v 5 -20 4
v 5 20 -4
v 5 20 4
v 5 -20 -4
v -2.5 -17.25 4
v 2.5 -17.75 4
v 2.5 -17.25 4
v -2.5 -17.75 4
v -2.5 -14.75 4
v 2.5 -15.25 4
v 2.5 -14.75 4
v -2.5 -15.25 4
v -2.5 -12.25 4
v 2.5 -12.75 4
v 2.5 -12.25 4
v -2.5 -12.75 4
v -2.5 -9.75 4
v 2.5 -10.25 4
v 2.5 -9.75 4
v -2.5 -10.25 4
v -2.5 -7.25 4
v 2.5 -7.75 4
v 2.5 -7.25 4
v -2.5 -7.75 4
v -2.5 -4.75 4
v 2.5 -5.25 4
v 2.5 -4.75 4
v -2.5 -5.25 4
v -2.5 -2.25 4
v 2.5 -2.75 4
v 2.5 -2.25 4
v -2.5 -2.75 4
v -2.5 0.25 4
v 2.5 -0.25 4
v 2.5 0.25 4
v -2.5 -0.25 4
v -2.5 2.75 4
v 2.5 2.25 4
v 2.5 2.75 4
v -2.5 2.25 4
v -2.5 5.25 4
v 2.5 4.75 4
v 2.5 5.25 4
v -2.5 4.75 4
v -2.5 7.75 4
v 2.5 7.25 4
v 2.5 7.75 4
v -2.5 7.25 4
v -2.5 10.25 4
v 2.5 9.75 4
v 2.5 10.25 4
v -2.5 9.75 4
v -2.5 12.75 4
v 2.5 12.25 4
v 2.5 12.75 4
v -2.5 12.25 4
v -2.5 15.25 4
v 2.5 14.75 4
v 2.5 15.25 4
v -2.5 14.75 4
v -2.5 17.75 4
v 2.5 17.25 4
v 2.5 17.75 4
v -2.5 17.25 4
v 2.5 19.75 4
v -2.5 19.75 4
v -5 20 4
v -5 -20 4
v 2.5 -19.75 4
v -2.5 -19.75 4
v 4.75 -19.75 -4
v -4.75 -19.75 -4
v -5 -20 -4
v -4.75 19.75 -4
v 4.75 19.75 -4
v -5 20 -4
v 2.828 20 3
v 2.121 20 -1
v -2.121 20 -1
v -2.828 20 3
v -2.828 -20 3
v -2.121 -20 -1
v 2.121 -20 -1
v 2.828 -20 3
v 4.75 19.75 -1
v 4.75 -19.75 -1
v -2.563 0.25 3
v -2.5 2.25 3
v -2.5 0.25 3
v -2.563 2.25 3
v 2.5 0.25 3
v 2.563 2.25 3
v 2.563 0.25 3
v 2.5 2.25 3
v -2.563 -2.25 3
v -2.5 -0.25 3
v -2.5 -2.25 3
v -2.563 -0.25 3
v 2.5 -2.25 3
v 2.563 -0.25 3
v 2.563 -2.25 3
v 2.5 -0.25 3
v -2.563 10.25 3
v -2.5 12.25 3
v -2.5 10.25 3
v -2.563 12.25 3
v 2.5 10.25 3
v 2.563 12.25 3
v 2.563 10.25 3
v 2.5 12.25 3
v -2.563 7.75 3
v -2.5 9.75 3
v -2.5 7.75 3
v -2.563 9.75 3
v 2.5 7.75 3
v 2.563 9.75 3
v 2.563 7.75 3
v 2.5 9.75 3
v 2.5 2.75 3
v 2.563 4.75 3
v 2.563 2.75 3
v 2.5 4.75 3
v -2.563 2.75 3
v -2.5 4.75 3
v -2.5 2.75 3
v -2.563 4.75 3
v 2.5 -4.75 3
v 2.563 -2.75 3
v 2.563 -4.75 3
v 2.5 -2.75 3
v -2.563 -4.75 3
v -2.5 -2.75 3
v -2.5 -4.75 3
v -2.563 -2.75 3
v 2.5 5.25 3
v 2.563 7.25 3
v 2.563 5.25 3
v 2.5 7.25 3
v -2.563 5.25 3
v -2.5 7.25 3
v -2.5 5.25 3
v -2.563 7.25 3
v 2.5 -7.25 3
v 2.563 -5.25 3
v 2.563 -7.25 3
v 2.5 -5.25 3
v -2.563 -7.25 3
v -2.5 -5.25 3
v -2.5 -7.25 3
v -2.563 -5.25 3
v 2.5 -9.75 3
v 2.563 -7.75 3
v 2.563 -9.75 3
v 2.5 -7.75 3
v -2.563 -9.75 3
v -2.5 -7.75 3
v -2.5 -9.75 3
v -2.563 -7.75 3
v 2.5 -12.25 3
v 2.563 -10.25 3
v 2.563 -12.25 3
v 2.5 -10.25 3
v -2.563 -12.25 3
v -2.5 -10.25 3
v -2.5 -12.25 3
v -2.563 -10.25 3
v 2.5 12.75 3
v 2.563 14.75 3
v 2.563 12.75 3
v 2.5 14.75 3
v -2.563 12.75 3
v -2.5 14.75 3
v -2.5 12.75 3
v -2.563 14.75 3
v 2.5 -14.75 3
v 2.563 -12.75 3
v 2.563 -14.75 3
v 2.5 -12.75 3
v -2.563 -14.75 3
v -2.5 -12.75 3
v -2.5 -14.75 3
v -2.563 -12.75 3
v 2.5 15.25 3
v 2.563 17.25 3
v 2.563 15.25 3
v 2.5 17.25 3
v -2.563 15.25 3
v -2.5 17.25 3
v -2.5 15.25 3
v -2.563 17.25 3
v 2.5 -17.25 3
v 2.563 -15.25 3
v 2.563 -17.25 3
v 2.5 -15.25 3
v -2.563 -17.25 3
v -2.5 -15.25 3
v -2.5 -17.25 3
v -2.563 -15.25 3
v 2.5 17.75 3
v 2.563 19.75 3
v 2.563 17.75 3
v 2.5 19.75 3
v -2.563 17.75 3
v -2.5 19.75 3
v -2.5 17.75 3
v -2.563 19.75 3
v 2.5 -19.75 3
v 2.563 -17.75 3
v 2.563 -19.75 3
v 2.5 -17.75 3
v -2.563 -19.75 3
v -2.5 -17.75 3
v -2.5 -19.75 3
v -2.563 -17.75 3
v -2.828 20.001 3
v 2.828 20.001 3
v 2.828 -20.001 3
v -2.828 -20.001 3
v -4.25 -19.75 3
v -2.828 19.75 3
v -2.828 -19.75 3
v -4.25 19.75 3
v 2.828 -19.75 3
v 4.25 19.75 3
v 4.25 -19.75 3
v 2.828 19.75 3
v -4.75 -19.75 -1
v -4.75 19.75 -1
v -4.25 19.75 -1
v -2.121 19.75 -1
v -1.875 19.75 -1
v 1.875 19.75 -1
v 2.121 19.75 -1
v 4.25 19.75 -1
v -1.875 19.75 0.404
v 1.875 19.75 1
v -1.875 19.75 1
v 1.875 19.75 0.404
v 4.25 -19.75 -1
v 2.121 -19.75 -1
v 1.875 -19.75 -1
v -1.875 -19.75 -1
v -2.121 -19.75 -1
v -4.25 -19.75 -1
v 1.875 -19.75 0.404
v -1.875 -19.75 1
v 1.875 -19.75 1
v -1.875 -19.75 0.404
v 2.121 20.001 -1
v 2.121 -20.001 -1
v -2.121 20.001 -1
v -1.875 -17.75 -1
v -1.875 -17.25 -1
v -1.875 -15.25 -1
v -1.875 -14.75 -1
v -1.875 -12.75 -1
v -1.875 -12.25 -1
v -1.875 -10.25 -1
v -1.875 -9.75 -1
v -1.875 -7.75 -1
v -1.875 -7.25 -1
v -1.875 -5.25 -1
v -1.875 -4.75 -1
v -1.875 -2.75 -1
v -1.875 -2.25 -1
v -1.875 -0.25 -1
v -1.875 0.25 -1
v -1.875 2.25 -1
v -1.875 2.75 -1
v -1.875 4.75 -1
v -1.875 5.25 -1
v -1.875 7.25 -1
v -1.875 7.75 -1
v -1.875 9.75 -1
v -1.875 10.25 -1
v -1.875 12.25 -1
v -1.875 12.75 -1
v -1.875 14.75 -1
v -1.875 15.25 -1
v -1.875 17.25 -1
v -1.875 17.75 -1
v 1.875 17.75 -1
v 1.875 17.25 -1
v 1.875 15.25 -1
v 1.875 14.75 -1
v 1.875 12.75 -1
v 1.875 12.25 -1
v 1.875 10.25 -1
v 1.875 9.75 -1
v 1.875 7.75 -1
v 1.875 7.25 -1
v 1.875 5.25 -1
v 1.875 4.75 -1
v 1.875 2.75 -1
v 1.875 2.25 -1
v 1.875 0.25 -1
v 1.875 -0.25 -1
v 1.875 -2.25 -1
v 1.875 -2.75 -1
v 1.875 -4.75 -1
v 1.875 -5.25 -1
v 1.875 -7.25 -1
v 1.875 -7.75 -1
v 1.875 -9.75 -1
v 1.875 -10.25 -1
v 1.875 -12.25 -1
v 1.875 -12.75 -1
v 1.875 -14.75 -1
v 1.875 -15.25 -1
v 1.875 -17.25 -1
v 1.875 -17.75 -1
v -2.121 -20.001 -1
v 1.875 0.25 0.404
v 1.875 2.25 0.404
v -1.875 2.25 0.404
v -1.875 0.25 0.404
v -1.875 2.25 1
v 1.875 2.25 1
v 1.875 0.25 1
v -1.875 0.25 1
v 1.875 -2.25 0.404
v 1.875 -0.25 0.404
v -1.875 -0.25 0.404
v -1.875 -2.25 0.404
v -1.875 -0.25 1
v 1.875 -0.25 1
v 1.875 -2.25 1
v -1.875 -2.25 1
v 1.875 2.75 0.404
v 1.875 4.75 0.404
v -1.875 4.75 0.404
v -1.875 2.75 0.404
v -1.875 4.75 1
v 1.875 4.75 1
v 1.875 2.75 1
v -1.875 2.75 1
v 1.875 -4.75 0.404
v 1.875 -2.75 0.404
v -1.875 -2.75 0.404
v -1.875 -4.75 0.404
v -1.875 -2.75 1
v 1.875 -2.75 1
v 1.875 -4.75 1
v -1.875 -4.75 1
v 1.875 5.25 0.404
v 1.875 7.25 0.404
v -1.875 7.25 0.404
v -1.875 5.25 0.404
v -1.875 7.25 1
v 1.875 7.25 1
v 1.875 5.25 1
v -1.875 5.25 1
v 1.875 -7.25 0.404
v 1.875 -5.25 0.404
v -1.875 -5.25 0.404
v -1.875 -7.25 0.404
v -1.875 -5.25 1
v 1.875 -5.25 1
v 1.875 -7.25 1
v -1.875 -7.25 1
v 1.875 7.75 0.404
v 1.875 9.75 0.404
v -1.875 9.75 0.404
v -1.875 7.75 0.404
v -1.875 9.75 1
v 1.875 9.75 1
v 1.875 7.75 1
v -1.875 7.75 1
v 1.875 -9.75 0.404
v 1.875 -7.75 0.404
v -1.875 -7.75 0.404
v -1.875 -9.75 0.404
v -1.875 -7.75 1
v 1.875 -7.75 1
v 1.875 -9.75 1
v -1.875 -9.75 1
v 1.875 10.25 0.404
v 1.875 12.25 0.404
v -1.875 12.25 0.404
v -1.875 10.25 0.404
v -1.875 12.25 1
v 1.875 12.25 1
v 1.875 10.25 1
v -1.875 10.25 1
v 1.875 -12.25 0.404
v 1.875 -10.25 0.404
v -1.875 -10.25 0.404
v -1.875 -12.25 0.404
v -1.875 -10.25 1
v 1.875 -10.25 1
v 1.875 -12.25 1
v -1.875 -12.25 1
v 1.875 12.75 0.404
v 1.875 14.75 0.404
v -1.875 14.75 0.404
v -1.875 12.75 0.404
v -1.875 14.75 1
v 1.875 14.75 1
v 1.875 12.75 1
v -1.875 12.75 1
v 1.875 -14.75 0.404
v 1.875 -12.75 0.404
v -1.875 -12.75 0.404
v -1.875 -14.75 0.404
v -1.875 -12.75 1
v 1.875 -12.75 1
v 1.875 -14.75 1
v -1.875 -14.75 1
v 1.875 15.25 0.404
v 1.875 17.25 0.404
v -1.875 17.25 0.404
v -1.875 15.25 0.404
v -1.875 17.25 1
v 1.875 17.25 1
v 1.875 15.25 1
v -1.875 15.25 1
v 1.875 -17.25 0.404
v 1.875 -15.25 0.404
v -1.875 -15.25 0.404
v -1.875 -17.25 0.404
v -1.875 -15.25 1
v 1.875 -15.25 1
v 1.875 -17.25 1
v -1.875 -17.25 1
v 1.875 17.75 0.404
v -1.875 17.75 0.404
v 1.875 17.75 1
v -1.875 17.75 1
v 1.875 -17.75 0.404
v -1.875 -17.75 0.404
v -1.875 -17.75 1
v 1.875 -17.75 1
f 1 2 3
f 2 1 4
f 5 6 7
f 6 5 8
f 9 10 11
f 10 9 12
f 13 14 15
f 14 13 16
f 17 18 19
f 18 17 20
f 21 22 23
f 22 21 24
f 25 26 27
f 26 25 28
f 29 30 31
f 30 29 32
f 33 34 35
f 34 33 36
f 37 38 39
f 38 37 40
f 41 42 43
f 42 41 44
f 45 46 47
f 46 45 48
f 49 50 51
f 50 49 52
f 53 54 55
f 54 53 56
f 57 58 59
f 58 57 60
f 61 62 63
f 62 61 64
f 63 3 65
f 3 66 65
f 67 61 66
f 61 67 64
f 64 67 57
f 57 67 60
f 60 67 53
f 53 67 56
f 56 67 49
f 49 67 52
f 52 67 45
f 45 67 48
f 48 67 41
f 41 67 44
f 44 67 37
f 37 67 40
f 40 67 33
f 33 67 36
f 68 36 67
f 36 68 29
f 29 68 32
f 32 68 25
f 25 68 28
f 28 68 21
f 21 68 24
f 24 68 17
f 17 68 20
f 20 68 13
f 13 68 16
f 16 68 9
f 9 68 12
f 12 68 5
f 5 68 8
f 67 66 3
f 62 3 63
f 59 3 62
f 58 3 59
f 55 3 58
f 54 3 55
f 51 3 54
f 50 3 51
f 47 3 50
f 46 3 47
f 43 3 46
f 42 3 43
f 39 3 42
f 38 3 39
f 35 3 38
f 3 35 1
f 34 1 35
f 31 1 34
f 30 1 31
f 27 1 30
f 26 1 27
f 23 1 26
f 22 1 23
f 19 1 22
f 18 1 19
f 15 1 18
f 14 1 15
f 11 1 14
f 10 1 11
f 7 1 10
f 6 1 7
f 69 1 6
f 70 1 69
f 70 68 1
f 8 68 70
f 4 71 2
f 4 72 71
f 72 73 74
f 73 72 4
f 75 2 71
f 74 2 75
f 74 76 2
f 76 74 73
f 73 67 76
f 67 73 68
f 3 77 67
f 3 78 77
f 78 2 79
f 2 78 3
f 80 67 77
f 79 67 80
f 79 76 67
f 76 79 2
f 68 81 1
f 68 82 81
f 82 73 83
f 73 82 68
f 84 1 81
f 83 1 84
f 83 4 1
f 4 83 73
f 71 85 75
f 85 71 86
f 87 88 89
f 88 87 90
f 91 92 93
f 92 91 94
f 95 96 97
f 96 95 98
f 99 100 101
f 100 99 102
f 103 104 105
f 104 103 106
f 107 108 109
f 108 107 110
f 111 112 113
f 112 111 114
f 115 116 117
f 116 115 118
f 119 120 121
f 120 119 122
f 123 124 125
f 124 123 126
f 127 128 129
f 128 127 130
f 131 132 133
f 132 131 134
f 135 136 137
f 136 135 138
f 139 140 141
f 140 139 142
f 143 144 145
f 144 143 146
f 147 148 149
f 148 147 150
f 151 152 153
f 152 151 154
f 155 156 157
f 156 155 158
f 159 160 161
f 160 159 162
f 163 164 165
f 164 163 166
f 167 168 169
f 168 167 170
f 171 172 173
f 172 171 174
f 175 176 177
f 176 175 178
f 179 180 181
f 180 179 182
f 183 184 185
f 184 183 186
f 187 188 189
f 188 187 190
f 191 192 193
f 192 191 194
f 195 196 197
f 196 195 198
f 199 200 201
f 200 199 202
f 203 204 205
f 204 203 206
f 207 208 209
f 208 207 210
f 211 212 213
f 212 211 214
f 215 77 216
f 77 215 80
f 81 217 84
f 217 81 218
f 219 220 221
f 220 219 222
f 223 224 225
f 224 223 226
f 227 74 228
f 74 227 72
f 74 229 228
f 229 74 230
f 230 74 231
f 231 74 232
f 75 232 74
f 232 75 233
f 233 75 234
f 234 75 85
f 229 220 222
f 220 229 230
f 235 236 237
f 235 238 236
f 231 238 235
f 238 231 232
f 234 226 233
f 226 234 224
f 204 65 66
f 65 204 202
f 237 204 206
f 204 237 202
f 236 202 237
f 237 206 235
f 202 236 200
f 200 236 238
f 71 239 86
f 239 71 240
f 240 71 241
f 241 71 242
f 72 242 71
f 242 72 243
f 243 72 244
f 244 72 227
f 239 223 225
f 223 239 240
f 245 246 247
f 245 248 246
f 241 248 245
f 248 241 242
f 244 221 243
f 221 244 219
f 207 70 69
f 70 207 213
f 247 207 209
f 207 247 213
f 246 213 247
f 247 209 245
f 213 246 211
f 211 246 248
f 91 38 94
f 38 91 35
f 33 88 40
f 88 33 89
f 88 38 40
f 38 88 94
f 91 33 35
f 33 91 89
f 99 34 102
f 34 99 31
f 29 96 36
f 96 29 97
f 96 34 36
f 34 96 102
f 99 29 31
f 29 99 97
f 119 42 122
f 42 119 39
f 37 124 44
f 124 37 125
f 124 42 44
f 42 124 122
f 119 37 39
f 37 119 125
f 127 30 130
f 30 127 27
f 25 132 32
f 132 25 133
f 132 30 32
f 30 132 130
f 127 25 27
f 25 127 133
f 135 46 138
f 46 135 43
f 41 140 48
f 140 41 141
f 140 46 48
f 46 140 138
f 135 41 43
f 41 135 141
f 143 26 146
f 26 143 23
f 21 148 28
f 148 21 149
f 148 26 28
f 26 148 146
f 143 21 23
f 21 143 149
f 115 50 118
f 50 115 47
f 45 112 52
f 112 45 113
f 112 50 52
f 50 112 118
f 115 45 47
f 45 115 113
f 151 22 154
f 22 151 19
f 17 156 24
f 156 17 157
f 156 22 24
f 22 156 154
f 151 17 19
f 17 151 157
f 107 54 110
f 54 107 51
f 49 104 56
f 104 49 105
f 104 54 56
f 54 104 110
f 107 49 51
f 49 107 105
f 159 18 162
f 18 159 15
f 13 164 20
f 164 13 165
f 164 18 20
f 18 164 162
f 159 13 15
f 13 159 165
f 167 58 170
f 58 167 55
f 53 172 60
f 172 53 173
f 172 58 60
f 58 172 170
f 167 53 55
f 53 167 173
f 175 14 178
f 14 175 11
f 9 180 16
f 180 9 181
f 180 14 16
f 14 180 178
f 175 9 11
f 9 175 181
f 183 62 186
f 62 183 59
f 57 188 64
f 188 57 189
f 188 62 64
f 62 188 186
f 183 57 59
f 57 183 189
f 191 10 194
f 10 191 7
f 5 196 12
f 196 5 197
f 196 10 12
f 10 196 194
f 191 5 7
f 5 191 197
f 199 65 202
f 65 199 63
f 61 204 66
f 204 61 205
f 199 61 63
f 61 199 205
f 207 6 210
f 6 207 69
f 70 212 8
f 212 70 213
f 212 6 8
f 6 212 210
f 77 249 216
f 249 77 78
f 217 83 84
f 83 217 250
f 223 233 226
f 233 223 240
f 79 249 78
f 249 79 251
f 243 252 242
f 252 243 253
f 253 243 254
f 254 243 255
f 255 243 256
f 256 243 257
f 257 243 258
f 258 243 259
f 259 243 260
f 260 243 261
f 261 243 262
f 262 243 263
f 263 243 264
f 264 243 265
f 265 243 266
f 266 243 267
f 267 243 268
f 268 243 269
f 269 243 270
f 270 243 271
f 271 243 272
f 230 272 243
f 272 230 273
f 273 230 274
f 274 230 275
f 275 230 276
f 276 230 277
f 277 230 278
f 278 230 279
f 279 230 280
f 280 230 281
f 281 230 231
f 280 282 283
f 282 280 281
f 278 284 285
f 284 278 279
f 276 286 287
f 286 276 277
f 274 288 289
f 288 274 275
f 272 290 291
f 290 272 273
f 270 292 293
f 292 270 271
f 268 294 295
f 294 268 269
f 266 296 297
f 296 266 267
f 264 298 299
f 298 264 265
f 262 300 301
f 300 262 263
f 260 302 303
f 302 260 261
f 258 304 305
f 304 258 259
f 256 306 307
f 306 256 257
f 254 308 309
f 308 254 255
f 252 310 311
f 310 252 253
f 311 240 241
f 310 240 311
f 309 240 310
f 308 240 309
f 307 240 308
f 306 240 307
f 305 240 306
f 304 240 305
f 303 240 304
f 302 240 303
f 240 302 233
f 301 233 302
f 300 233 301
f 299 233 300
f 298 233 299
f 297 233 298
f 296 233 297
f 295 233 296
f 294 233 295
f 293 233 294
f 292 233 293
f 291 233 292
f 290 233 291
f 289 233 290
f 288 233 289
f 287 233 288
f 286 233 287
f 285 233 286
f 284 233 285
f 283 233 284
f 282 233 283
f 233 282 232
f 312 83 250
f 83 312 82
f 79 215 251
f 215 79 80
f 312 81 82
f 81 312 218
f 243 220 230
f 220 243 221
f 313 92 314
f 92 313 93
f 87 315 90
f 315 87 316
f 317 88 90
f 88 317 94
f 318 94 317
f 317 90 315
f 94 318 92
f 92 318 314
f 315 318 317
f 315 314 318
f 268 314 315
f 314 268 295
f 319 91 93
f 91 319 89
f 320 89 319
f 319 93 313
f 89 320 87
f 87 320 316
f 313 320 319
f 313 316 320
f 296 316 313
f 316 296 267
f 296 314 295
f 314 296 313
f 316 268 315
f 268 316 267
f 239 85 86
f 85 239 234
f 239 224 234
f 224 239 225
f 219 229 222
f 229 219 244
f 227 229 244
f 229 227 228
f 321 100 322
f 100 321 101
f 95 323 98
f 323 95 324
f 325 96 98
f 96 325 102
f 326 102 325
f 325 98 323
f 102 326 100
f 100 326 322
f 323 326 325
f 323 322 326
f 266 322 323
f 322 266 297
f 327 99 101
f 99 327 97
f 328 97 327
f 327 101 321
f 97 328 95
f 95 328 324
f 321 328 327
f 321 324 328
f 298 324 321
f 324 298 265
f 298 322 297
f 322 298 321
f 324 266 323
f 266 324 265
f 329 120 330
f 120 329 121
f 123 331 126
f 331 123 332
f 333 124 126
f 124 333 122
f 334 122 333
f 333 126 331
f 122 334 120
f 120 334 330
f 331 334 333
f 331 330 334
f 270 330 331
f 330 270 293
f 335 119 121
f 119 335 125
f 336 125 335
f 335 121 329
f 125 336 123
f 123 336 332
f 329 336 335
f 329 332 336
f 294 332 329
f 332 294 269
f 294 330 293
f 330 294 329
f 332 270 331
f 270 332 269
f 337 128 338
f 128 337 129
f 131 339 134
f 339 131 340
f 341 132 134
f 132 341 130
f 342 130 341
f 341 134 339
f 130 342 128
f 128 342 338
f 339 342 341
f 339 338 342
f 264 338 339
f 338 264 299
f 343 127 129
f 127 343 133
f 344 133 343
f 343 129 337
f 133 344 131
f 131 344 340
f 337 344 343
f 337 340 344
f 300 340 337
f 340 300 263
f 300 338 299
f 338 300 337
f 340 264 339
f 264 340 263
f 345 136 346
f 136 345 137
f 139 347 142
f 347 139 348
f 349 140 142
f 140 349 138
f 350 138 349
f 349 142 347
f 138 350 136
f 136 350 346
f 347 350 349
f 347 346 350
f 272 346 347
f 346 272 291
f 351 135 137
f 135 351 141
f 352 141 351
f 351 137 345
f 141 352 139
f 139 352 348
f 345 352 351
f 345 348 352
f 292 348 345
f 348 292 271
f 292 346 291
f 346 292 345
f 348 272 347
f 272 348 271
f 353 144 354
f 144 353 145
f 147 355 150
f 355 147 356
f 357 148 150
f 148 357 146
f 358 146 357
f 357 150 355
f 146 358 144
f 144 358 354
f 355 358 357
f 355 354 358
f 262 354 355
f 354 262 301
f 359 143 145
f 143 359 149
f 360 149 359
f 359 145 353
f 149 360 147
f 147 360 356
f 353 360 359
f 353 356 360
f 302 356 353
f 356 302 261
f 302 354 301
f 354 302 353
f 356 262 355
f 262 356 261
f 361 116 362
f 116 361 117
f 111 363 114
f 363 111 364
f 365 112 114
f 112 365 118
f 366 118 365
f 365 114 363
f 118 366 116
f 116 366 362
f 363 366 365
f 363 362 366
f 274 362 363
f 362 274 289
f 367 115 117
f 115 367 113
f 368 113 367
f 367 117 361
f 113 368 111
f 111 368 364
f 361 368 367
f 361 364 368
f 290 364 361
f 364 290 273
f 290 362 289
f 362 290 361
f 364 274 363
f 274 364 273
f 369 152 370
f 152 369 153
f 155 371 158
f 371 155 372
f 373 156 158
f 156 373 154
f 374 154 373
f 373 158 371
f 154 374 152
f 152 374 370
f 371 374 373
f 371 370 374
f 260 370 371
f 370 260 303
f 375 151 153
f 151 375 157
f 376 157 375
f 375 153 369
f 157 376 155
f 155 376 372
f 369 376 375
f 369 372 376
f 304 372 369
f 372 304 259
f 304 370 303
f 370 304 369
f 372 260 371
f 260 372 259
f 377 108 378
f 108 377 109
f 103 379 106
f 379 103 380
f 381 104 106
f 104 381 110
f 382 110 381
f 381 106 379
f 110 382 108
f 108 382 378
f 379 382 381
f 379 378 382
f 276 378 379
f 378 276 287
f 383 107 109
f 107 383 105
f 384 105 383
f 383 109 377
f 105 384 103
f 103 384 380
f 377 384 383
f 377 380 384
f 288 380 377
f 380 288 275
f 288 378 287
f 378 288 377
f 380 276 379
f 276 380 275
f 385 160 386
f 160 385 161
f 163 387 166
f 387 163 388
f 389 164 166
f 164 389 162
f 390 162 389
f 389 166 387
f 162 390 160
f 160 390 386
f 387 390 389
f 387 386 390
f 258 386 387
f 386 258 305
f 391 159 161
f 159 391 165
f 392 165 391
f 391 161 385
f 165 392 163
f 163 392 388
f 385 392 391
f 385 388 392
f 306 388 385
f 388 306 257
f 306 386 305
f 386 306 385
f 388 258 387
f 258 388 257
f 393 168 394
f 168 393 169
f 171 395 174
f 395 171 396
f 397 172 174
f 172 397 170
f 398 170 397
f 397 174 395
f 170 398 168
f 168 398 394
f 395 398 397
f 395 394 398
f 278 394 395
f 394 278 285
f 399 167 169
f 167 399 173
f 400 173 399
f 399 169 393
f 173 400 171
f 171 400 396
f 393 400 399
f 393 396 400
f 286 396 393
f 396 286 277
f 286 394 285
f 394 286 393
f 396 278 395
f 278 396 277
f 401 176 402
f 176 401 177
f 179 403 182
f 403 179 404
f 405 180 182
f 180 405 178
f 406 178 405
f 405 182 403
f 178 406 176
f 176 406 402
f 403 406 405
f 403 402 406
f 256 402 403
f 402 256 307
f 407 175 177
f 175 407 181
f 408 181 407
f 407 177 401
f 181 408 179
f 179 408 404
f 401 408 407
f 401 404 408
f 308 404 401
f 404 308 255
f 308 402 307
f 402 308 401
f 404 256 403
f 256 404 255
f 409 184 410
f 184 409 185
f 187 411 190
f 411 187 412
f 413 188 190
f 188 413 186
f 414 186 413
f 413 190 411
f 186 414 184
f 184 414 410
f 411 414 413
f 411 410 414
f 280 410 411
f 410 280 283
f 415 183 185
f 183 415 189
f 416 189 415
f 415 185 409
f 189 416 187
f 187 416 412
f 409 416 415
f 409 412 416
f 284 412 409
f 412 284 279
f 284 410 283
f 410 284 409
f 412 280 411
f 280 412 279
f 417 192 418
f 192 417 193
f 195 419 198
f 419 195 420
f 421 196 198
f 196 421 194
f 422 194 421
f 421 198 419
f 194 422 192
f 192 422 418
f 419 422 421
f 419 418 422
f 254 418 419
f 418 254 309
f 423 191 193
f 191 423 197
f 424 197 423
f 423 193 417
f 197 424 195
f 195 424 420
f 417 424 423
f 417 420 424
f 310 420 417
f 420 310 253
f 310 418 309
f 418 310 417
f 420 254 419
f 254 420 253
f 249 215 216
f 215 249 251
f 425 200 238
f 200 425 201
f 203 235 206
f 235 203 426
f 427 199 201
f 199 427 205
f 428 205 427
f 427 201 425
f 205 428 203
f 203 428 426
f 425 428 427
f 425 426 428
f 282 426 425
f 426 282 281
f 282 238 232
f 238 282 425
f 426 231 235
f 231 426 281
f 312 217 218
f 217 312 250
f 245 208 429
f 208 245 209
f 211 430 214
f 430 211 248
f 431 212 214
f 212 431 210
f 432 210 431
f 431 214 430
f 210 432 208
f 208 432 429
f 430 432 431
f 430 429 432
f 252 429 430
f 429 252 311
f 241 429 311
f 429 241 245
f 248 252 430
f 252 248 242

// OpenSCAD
$fn=50;
$t=true;        //Abbreviation
$wth=.5;        //Wall Thickness
$l=40;          //Length
$w=10;          //Width
$h=8;           //Height
$ow=5;          //LED Opening Width
$oiw=3.5;       //LED Opening Inside Width
$ol=2;          //LED Opening length
$os=.5;         //LED Opening Spacing
$ols=$ol+$os;   //Distance per LED
$olso=$ols/2;   //Offset for Center
$od=4;          //LED Opening Depth

module ledopening() {
    cube([$ow,$ol,$wth*4], center=$t);
}

module ledconduit() {
    difference() {
        difference() {
            rotate([0,0,45]) cylinder($h/2, $oiw-.5, $ow-1, $fn=4, center=$t);
            translate([0,3.751,0]) cube([$ow*2,$ow,$ow], center=$t);
            translate([0,-3.751,0]) cube([$ow*2,$ow,$ow], center=$t);
        }
        difference() {
            rotate([0,0,45]) translate([0,0,1]) cylinder($h/2, $oiw-1, $ow-1, $fn=4, center=$t);
            translate([0,3.5,1]) cube([$ow*2,$ow,$ow], center=$t);
            translate([0,-3.5,.51]) cube([$ow*2,$ow,$ow], center=$t);
        }
        translate([0,0,-1]) cube([$ow-$olso,$ol,$h/4], center=$t);
    }
    translate([4.5,0,0]) cube([.5,2.5,4], center=$t);
    translate([-4.5,0,0]) cube([.5,2.5,4], center=$t);
}

difference() {
    cube([$w,$l,$h], center=$t);
    translate([0,0,-$wth*2]) cube([$w-$wth,$l-$wth,$h], center=$t);
    translate([0,$olso,$h/2]) ledopening();         //LED #8
    translate([0,-$olso,$h/2]) ledopening();        //LED #9
    translate([0,$olso+$ols,$h/2]) ledopening();    //LED #7
    translate([0,-$olso-$ols,$h/2]) ledopening();   //LED #10
    translate([0,$olso+$ols*2,$h/2]) ledopening();  //LED #6
    translate([0,-$olso-$ols*2,$h/2]) ledopening(); //LED #11
    translate([0,$olso+$ols*3,$h/2]) ledopening();  //LED #5
    translate([0,-$olso-$ols*3,$h/2]) ledopening(); //LED #12
    translate([0,$olso+$ols*4,$h/2]) ledopening();  //LED #4
    translate([0,-$olso-$ols*4,$h/2]) ledopening(); //LED #13
    translate([0,$olso+$ols*5,$h/2]) ledopening();  //LED #3
    translate([0,-$olso-$ols*5,$h/2]) ledopening(); //LED #14
    translate([0,$olso+$ols*6,$h/2]) ledopening();  //LED #2
    translate([0,-$olso-$ols*6,$h/2]) ledopening(); //LED #15
    translate([0,$olso+$ols*7,$h/2]) ledopening();  //LED #1
    translate([0,-$olso-$ols*7,$h/2]) ledopening(); //LED #16
}
//translate([0,$olso,$h]) ledconduit();
translate([0,$olso,1]) ledconduit();                //LED Conduit #8
translate([0,-$olso,1]) ledconduit();               //LED Conduit #9
translate([0,$olso+$ols,1]) ledconduit();           //LED Conduit #7
translate([0,-$olso-$ols,1]) ledconduit();          //LED Conduit #10
translate([0,$olso+$ols*2,1]) ledconduit();         //LED Conduit #6
translate([0,-$olso-$ols*2,1]) ledconduit();        //LED Conduit #11
translate([0,$olso+$ols*3,1]) ledconduit();         //LED Conduit #5
translate([0,-$olso-$ols*3,1]) ledconduit();        //LED Conduit #12
translate([0,$olso+$ols*4,1]) ledconduit();         //LED Conduit #4
translate([0,-$olso-$ols*4,1]) ledconduit();        //LED Conduit #13
translate([0,$olso+$ols*5,1]) ledconduit();         //LED Conduit #3
translate([0,-$olso-$ols*5,1]) ledconduit();        //LED Conduit #14
translate([0,$olso+$ols*6,1]) ledconduit();         //LED Conduit #2
translate([0,-$olso-$ols*6,1]) ledconduit();        //LED Conduit #15
translate([0,$olso+$ols*7,1]) ledconduit();         //LED Conduit #1
translate([0,-$olso-$ols*7,1]) ledconduit();        //LED Conduit #16
